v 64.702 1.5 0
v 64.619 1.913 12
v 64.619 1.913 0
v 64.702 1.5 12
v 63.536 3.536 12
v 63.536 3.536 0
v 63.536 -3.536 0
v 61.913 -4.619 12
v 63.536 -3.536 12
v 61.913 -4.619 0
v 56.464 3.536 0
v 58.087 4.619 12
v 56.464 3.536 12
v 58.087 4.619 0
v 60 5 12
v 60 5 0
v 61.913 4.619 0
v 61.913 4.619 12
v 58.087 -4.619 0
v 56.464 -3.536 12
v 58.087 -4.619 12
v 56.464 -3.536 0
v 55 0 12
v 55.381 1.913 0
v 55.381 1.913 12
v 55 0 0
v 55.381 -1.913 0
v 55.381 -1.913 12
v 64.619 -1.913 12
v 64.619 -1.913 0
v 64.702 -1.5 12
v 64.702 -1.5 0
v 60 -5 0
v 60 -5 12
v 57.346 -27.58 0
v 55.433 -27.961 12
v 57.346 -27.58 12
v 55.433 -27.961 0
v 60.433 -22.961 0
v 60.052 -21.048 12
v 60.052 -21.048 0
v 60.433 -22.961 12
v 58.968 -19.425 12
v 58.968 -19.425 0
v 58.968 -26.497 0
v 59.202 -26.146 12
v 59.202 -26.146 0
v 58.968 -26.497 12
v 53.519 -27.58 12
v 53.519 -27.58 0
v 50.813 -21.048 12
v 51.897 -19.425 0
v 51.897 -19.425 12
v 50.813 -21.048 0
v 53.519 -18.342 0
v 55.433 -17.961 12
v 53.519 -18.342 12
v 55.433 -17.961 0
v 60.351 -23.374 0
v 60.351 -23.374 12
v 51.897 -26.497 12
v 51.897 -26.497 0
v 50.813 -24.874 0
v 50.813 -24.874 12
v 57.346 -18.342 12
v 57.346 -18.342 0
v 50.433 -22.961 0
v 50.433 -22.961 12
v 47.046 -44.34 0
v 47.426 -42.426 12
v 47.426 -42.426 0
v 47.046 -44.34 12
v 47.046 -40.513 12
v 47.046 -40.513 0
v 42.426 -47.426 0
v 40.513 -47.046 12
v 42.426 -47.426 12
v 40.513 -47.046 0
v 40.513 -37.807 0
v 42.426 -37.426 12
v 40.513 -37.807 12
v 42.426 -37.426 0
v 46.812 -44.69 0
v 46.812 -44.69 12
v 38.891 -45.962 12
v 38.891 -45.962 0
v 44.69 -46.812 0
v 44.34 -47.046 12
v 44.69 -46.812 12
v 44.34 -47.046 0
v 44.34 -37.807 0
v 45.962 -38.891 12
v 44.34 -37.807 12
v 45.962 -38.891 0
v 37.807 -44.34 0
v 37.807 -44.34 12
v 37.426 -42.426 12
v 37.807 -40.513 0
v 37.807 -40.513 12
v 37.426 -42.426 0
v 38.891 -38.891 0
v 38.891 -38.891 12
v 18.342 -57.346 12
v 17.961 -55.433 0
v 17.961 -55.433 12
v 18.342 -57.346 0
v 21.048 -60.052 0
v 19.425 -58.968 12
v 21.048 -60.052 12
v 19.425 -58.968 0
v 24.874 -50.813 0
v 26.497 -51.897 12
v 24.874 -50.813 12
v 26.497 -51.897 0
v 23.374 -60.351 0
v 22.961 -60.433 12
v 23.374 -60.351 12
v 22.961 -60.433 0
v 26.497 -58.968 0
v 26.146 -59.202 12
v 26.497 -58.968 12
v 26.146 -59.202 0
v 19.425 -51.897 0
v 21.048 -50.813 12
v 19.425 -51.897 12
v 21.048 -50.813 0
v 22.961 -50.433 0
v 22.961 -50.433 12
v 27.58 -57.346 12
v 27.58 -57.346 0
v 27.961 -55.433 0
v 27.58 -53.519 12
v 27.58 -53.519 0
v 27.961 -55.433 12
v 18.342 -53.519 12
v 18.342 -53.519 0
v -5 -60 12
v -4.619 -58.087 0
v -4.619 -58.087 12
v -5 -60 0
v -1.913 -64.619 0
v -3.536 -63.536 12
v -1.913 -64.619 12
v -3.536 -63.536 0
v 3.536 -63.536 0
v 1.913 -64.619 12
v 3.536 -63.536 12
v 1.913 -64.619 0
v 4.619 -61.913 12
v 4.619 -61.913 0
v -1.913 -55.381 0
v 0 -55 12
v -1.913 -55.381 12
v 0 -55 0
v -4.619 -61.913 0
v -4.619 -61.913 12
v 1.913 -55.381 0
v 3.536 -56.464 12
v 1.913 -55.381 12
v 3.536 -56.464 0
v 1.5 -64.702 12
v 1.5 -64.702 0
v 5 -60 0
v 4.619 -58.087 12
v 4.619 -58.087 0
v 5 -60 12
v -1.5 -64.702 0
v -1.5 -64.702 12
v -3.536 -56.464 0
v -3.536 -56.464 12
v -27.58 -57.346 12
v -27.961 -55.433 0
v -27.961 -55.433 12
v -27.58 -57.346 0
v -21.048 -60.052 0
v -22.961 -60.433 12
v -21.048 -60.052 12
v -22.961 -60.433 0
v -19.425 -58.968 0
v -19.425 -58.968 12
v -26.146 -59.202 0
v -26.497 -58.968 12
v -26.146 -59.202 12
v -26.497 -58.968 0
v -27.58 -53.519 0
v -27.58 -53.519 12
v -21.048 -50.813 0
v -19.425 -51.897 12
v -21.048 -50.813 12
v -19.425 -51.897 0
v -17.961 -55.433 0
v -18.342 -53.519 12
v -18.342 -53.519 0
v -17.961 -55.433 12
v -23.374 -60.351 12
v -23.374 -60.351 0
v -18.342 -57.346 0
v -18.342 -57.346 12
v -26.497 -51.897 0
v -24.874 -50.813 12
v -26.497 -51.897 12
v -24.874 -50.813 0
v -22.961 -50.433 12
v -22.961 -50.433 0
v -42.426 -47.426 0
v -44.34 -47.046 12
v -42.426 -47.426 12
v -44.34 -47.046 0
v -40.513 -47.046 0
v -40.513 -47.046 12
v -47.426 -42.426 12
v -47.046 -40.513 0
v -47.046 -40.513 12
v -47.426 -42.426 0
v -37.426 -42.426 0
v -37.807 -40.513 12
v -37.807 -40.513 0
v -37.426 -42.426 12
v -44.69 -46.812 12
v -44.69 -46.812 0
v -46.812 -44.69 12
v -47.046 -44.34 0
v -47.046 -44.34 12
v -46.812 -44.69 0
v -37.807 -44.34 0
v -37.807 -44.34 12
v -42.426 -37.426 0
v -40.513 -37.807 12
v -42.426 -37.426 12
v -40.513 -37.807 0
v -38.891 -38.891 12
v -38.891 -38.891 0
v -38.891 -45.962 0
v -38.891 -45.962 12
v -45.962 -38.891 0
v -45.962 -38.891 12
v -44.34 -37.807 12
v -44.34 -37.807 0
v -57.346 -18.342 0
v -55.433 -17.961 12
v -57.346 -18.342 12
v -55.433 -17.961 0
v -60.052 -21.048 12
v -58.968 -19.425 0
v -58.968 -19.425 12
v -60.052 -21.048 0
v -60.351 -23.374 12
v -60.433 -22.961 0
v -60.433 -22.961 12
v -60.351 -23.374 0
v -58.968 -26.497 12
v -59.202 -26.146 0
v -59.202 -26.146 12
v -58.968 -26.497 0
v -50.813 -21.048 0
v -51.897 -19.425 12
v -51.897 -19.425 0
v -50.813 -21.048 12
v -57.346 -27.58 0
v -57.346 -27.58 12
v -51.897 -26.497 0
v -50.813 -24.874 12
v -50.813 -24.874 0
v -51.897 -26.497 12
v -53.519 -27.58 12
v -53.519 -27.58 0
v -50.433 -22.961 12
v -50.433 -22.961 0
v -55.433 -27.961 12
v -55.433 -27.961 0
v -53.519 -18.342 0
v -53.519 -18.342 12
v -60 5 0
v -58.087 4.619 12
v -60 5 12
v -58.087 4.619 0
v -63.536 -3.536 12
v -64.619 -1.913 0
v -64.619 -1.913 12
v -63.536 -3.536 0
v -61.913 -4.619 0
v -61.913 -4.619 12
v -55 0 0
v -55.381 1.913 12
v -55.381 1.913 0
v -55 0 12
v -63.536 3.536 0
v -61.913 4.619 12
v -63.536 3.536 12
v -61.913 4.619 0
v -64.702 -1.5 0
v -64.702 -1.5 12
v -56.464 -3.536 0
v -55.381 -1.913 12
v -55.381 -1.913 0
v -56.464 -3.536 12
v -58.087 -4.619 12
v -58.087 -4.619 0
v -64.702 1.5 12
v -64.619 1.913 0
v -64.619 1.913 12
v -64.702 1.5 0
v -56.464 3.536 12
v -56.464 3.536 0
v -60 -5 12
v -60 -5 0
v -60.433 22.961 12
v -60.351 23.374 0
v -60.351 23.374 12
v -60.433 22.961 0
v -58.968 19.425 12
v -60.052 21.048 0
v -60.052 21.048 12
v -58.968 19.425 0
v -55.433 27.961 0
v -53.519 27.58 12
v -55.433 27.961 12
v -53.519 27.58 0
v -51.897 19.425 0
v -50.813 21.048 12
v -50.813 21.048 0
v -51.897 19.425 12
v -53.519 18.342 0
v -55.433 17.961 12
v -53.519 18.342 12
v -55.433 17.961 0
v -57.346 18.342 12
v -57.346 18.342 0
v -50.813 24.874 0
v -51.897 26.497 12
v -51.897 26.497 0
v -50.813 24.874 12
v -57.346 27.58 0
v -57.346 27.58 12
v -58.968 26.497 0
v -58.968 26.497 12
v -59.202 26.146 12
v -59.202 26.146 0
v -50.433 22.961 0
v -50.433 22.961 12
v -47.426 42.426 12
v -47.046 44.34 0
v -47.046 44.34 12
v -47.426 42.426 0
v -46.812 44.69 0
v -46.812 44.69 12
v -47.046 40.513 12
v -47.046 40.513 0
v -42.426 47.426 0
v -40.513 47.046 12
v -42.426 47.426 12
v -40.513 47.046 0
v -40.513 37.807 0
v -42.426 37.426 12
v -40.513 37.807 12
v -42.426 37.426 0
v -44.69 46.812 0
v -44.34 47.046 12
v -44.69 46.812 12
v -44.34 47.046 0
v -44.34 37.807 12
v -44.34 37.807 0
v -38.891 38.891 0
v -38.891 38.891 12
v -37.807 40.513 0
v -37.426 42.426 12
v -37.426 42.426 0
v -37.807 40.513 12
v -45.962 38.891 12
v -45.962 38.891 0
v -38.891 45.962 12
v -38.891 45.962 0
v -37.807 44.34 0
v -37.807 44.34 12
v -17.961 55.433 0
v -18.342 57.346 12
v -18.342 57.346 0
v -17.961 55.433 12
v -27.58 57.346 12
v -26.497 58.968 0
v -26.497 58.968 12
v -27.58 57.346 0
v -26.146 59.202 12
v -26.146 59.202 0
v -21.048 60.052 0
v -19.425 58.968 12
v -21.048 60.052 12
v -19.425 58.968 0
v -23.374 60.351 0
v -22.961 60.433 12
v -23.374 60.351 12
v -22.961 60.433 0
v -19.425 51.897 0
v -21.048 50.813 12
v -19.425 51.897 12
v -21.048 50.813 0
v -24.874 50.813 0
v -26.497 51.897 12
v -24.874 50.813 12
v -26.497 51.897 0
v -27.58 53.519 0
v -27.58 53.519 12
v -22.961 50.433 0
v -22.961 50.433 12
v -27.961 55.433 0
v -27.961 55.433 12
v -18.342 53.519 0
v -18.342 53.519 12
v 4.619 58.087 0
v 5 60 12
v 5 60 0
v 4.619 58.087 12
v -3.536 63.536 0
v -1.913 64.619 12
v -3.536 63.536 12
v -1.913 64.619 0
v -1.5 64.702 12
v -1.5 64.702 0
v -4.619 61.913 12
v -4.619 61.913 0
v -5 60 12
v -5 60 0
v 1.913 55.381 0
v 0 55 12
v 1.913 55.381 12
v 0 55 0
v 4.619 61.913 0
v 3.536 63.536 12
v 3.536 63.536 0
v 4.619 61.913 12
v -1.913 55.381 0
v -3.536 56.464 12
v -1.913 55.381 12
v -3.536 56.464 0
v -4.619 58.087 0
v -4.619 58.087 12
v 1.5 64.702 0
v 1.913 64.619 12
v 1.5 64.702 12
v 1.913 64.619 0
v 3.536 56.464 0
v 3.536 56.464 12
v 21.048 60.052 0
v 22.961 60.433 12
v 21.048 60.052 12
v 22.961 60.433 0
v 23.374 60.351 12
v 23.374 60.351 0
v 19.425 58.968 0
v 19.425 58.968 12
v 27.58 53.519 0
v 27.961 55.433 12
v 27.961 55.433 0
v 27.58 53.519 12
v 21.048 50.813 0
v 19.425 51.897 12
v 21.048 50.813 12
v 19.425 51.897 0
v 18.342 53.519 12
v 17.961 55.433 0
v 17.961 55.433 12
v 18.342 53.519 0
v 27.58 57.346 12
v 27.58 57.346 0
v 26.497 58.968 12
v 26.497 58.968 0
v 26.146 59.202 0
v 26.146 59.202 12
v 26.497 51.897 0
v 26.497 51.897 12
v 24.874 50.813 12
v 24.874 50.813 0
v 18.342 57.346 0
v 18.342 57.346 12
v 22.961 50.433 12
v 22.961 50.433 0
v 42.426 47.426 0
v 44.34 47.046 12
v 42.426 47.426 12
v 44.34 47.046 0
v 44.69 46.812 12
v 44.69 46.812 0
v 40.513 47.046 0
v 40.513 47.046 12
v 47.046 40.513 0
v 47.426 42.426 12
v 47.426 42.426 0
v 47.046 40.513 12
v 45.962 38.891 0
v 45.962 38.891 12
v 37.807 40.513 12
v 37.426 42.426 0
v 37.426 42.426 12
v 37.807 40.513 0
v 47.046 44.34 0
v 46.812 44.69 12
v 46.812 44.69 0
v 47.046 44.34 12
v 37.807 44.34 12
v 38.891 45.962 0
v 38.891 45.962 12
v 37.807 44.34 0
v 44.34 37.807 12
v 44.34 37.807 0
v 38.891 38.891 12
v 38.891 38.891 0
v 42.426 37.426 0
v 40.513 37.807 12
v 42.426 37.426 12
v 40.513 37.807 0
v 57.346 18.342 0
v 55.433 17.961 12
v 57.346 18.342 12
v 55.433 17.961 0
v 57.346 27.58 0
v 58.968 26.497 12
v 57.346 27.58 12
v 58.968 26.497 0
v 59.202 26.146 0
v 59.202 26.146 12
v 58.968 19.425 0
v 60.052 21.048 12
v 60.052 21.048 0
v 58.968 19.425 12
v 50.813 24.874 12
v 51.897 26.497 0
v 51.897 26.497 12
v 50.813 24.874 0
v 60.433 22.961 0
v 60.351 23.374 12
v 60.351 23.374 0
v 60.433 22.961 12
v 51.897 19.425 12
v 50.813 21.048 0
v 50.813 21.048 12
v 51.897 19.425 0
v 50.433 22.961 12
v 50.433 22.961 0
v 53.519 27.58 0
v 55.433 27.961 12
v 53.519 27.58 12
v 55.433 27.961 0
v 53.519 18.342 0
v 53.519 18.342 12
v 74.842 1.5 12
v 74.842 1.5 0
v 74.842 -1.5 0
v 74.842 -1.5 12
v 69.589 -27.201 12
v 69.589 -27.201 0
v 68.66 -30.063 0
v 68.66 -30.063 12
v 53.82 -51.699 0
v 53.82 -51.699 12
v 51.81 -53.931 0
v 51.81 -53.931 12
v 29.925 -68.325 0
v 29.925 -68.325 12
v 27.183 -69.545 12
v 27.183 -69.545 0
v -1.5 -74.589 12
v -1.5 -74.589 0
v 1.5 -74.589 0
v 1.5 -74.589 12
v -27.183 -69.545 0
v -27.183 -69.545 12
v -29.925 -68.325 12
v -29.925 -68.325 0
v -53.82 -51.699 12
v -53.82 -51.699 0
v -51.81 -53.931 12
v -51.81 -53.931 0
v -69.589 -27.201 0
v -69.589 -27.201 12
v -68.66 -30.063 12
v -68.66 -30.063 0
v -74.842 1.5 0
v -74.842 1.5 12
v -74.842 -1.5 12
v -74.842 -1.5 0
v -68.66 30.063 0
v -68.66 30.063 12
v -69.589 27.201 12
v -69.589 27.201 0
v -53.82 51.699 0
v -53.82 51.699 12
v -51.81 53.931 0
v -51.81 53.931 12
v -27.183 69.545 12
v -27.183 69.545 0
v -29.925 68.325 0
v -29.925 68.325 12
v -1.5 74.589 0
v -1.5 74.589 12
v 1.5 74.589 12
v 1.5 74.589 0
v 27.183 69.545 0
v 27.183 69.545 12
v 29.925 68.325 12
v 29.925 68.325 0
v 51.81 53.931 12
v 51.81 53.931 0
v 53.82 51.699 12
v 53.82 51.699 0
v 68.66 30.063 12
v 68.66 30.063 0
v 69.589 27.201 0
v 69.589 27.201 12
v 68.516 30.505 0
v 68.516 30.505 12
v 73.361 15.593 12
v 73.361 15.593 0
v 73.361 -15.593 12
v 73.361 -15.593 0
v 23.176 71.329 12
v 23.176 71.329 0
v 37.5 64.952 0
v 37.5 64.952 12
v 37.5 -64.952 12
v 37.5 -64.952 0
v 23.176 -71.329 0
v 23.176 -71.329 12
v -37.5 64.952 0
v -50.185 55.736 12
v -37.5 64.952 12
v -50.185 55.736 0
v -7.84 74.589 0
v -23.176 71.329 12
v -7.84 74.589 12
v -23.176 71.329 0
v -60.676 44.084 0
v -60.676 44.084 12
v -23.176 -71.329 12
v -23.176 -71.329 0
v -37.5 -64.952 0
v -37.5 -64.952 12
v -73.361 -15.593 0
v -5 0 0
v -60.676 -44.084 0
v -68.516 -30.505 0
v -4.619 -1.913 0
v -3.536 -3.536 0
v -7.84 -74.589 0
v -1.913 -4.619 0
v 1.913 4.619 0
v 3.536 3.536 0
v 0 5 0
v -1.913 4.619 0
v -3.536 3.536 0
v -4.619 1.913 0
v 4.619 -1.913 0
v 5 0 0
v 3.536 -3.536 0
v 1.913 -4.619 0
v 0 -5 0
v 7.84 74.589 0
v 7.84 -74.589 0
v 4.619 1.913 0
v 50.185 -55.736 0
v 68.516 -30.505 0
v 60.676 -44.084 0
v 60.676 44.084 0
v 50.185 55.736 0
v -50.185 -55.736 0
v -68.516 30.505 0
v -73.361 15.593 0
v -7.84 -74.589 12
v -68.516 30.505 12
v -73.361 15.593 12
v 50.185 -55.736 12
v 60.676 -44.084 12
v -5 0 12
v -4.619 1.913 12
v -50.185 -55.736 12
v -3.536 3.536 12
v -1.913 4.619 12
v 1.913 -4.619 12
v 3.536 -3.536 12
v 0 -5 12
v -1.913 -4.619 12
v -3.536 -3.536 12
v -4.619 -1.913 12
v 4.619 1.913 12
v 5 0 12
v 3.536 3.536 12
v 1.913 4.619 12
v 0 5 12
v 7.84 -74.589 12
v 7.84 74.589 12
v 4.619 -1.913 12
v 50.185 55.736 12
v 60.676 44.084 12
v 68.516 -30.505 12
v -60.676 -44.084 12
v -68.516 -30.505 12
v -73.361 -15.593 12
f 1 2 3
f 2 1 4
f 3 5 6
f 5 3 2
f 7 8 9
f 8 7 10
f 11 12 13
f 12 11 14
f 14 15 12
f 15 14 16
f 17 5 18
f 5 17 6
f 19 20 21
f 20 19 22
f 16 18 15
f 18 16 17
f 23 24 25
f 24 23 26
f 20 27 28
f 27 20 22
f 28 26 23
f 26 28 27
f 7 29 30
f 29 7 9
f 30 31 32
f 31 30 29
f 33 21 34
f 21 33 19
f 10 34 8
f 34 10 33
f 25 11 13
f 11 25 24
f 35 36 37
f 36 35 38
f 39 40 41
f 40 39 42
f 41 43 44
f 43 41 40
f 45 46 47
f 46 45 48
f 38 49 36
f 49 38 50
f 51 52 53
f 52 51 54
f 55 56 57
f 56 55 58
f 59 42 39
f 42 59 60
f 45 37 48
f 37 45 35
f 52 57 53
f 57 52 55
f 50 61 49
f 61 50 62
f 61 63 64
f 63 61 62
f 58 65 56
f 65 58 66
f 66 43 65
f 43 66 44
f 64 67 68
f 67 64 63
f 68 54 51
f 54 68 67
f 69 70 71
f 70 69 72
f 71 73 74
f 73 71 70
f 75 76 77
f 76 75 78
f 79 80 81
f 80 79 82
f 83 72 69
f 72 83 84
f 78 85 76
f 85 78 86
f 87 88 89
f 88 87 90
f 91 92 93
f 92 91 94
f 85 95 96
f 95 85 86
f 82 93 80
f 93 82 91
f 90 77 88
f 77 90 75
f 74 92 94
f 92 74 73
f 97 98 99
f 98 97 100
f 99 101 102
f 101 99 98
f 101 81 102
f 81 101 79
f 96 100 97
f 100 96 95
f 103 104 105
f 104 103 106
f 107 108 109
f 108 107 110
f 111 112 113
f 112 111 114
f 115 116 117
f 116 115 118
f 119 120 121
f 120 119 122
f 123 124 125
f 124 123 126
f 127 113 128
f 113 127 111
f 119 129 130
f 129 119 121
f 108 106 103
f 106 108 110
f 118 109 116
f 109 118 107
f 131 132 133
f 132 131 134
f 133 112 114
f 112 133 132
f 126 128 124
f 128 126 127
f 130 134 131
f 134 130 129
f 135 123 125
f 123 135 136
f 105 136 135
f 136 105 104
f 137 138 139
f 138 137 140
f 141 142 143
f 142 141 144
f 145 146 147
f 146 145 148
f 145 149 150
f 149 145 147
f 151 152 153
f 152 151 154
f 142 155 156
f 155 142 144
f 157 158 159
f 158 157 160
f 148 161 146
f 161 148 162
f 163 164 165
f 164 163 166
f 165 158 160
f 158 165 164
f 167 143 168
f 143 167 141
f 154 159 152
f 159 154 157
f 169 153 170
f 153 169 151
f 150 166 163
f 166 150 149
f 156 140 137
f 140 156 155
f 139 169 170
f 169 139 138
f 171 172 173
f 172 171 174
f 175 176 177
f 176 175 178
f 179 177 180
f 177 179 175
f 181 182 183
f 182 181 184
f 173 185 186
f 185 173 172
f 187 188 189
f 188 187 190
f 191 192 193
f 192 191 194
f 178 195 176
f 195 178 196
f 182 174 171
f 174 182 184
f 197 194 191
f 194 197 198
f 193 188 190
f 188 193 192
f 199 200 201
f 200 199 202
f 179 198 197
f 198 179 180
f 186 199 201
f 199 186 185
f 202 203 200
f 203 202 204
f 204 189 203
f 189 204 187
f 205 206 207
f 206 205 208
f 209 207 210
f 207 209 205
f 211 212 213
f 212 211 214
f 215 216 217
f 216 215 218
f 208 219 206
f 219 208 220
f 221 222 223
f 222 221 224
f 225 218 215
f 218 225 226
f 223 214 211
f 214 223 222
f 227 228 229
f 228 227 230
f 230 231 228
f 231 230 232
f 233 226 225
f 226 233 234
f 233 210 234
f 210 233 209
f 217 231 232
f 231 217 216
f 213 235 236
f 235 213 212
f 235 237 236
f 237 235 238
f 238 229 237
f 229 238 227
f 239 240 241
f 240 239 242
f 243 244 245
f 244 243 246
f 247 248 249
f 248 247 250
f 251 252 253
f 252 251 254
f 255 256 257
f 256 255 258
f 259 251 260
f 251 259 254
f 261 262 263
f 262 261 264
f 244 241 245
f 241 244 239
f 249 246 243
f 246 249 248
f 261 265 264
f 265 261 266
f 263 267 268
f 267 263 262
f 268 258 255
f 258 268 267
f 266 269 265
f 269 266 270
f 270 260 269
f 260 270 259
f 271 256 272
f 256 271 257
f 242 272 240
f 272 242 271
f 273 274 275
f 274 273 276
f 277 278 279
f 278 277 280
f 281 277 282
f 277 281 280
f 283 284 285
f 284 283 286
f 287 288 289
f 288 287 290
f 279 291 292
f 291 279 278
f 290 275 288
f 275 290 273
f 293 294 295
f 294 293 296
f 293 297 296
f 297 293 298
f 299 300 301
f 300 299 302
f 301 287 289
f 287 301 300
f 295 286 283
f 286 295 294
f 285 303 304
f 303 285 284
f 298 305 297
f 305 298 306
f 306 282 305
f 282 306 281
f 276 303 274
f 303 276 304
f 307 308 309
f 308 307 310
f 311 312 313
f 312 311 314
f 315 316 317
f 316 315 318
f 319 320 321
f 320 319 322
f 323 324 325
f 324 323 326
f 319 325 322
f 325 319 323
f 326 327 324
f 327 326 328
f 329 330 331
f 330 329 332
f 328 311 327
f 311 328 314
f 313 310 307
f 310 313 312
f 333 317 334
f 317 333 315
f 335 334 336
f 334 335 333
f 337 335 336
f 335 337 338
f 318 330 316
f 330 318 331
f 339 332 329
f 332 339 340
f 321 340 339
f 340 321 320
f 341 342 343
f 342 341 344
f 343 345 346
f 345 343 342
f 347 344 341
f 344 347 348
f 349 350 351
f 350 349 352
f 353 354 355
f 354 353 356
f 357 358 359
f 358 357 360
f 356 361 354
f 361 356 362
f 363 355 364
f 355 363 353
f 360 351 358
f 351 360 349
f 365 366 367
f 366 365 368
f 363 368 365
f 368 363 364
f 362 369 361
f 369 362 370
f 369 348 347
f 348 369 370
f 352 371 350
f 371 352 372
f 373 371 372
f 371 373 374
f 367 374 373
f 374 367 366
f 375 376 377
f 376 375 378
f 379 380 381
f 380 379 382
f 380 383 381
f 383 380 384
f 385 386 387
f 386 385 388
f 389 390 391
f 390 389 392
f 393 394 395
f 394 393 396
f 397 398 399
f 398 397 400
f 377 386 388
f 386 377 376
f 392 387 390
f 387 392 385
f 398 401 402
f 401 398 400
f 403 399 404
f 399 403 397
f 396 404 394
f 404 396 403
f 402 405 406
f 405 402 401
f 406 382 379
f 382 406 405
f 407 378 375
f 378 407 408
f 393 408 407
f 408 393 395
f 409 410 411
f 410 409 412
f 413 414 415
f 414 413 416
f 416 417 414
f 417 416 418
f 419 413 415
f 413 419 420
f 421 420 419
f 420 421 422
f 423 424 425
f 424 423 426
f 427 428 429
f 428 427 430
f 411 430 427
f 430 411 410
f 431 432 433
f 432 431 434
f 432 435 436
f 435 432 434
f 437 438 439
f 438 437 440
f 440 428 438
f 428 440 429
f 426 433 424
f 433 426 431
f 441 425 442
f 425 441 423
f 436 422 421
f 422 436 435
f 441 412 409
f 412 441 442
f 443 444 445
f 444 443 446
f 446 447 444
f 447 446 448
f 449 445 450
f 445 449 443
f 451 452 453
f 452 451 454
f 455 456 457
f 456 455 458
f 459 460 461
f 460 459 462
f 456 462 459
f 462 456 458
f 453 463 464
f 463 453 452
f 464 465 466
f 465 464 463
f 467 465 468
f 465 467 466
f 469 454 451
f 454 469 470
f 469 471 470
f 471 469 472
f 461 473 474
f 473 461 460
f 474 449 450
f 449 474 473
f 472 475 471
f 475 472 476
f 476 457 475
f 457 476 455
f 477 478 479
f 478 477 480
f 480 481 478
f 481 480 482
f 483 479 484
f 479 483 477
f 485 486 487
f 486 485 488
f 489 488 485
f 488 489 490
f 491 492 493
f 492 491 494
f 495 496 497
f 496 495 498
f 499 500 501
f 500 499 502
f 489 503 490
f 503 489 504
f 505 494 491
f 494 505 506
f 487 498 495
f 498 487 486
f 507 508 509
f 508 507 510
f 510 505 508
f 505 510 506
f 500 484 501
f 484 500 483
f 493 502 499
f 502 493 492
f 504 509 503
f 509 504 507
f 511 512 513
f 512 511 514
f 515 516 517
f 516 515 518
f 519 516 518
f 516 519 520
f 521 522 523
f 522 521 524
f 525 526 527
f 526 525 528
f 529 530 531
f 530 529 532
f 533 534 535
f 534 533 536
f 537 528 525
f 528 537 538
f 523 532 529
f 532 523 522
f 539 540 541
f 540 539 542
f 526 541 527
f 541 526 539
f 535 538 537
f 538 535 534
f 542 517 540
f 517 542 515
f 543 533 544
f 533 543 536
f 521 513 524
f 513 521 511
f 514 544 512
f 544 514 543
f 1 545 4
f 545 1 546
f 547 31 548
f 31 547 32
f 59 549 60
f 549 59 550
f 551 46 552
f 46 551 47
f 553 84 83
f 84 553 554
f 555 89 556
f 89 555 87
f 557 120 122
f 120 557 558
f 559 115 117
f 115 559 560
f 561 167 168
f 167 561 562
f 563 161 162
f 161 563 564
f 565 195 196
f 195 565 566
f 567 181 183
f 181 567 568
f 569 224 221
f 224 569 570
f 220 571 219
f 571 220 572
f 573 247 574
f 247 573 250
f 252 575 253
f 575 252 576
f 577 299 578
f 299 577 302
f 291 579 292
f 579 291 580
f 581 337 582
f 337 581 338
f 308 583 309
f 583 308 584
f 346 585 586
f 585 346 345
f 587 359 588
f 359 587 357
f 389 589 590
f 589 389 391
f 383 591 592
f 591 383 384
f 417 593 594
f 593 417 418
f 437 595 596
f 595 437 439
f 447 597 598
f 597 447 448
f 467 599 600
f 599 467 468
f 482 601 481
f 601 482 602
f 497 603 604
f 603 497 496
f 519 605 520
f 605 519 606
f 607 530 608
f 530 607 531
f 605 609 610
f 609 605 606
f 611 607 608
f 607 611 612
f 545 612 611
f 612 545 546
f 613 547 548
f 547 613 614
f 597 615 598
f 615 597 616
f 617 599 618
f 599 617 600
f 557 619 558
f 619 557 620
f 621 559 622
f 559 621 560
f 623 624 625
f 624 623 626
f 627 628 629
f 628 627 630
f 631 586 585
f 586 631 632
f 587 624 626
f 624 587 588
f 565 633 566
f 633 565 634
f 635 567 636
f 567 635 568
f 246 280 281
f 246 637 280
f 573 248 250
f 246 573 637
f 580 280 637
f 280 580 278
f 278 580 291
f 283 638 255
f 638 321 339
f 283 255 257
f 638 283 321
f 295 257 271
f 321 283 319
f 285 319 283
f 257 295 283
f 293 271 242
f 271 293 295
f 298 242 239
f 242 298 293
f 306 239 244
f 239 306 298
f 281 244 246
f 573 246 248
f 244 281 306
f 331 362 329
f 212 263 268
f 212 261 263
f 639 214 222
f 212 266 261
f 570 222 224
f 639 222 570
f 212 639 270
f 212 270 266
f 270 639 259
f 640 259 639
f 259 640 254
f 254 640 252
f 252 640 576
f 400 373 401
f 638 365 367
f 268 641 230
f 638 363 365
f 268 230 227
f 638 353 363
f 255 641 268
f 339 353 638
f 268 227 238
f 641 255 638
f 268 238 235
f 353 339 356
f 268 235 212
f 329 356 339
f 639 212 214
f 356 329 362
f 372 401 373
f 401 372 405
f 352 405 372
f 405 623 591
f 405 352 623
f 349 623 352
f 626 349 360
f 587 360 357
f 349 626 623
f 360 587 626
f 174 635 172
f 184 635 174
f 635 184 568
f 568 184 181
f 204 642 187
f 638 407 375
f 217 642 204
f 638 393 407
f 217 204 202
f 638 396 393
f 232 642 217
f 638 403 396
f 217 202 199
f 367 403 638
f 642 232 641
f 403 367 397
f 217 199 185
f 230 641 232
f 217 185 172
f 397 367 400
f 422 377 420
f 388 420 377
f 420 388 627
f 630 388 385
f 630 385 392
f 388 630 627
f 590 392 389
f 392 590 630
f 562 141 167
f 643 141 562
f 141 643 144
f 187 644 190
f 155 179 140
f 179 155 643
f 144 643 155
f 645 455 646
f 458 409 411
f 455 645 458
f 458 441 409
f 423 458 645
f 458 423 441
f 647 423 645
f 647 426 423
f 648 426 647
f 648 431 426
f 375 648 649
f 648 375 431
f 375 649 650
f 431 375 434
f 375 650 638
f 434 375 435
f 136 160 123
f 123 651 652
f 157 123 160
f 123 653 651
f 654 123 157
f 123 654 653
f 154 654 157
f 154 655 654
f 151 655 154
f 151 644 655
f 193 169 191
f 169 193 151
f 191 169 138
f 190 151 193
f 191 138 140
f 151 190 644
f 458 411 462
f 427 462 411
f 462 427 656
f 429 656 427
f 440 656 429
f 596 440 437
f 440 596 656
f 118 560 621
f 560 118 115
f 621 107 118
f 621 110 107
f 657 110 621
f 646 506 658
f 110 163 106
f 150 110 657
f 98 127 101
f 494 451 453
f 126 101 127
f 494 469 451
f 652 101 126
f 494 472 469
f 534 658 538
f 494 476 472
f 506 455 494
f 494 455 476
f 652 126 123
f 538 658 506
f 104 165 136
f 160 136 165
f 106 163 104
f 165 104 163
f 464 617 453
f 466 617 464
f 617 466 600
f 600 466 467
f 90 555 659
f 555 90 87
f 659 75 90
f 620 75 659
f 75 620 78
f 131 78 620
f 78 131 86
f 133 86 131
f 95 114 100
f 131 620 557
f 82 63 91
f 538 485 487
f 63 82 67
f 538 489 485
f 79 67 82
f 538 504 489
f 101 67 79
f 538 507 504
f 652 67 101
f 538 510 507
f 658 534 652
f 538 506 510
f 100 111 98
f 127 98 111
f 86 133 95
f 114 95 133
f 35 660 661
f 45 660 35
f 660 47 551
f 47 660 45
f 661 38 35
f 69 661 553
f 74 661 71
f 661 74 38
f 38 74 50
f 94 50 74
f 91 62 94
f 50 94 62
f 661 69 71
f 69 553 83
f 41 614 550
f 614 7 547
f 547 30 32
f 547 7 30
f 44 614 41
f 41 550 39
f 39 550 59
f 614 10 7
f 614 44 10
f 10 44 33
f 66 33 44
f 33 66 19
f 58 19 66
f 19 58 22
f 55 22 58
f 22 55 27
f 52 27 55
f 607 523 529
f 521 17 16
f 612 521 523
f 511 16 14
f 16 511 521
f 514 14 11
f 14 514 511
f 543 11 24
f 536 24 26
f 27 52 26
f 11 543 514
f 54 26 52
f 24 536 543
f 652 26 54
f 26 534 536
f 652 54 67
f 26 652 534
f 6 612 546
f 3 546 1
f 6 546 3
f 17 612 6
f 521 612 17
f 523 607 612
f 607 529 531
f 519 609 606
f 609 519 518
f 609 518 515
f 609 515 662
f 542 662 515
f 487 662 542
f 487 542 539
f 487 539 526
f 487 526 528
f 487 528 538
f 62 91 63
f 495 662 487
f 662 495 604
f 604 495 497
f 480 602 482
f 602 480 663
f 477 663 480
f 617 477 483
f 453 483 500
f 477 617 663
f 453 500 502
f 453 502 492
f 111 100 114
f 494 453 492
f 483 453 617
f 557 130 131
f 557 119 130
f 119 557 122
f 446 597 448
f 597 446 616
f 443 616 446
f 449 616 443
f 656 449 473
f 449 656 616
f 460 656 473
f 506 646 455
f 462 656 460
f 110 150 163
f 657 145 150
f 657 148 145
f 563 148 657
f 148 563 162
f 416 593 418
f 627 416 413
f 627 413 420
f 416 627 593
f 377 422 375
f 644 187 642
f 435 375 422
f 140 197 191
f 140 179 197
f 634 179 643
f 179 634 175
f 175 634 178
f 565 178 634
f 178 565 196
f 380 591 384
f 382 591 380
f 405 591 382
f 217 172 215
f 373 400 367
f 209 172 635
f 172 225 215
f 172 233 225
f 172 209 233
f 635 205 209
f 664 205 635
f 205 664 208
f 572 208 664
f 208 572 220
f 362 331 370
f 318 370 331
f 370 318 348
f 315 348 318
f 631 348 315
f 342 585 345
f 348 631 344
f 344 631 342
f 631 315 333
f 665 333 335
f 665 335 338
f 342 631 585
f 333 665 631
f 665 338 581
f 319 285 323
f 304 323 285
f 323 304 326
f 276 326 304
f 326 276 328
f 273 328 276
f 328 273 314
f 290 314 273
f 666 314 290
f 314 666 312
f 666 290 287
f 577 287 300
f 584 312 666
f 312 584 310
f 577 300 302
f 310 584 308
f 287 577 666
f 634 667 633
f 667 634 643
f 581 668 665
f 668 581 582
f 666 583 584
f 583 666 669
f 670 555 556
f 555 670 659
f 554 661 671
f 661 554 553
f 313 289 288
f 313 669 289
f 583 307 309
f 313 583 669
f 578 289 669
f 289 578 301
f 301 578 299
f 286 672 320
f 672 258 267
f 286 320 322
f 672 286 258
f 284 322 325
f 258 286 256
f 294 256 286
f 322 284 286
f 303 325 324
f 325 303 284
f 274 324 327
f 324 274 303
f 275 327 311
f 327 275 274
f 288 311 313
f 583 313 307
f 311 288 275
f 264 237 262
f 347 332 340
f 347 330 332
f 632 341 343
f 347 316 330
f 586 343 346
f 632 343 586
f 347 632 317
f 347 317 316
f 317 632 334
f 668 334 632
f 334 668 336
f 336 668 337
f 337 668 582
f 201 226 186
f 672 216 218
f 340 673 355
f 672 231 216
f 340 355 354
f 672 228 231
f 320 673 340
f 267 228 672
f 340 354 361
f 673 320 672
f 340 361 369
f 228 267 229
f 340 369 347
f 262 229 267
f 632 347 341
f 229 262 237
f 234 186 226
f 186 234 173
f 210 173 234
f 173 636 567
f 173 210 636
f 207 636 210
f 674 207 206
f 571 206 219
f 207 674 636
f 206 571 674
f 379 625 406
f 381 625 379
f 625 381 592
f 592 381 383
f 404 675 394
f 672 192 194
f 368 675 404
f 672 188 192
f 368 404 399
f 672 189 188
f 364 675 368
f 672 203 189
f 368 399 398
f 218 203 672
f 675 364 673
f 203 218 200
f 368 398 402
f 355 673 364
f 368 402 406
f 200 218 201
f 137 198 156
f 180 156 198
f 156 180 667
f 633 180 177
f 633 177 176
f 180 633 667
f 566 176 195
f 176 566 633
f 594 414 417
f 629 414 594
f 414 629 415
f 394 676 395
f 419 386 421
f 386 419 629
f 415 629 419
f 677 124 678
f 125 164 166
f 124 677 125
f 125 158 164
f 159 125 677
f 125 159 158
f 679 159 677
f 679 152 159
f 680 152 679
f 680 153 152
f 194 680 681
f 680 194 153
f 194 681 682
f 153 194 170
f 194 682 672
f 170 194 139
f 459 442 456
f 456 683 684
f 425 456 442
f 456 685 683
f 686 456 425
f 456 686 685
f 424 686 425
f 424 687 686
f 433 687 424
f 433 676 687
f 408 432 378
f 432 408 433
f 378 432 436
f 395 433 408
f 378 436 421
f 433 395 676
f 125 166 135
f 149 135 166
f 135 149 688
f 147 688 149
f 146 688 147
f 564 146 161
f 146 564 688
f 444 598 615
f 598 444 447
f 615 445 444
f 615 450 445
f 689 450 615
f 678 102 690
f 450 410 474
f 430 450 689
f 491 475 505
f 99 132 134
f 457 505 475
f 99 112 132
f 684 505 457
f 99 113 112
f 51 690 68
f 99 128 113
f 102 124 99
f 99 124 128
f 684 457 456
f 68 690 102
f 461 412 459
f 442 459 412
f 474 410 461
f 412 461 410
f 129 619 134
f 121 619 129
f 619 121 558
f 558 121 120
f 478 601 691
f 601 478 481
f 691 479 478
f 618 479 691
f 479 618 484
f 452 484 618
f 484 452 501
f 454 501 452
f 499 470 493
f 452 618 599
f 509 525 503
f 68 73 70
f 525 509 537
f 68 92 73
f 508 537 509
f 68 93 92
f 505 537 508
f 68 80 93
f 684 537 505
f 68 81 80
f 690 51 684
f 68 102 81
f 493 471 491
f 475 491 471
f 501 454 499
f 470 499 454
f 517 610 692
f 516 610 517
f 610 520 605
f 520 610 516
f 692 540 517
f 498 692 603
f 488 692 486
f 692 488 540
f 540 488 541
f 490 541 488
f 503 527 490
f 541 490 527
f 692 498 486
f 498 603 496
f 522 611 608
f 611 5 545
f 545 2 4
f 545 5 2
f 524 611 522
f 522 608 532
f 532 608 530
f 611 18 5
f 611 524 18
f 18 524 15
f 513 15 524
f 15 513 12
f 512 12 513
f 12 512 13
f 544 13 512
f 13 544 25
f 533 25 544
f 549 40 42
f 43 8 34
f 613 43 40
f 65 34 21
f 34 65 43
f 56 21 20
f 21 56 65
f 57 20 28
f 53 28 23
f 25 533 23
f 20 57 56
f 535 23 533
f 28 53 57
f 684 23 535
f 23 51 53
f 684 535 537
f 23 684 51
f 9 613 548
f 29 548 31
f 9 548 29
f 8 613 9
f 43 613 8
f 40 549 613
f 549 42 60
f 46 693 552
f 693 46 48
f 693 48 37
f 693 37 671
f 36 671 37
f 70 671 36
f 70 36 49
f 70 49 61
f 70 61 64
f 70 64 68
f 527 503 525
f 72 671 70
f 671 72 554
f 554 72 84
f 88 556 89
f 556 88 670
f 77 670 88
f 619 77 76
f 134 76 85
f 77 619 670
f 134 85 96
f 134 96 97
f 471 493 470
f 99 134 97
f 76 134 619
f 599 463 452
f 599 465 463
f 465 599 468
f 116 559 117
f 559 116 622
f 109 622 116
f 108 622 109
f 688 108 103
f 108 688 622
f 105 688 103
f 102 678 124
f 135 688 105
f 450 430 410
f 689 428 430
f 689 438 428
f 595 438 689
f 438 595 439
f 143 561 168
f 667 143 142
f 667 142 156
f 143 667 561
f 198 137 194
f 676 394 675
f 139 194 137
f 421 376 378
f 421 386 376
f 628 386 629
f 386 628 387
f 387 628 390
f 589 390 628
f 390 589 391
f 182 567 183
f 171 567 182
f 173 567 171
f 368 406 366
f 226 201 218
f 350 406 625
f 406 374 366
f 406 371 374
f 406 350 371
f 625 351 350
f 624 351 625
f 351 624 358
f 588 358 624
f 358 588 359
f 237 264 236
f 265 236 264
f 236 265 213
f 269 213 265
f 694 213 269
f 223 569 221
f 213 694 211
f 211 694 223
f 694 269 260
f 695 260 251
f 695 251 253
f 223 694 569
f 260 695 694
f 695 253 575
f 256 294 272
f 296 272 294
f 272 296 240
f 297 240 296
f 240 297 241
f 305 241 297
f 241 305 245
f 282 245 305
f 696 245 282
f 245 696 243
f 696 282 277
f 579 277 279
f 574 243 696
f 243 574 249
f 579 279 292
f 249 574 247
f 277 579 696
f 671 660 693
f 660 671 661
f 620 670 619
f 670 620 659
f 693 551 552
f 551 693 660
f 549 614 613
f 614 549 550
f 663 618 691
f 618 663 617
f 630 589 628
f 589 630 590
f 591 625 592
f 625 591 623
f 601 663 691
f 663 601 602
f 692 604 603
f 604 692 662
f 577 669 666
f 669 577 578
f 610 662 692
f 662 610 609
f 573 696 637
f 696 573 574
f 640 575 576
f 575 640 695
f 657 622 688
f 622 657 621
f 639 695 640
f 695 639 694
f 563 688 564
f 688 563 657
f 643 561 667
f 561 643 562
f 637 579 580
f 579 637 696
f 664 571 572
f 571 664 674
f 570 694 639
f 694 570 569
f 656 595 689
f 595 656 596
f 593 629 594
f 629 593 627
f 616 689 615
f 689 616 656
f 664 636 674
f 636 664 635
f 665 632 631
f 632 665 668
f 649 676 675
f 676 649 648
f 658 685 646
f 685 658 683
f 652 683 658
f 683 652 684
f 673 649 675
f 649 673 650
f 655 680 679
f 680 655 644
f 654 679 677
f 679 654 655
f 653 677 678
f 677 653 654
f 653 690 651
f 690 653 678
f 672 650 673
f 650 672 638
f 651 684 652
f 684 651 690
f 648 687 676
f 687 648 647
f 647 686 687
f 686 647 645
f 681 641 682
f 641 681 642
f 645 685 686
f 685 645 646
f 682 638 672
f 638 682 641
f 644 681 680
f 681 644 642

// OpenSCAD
nbHoles=16;
diameter=10;
slit=3;

fullSize=150;
padding=10;
thickness=12;

translation=fullSize/2-padding-diameter/2;

difference() {
	cylinder(d=fullSize, h=thickness);
	translate([0,0,-0.005]) cylinder(d=10, h=30);
	for (i =  [0 : 1 : nbHoles]) {
	    rotate([0,0,-i/nbHoles*360]) 
	    	translate([translation,0, -0.005 ])
	    		cylinder(h = 30, d=diameter);
	}
	for (i =  [0 : 1 : nbHoles]) {
	    rotate([0,0,-i/nbHoles*360]) 
	    	translate ([translation+diameter/2+padding/2-1,0,-0.005]) cube([padding+2,slit,60],center=true);
	}
}
